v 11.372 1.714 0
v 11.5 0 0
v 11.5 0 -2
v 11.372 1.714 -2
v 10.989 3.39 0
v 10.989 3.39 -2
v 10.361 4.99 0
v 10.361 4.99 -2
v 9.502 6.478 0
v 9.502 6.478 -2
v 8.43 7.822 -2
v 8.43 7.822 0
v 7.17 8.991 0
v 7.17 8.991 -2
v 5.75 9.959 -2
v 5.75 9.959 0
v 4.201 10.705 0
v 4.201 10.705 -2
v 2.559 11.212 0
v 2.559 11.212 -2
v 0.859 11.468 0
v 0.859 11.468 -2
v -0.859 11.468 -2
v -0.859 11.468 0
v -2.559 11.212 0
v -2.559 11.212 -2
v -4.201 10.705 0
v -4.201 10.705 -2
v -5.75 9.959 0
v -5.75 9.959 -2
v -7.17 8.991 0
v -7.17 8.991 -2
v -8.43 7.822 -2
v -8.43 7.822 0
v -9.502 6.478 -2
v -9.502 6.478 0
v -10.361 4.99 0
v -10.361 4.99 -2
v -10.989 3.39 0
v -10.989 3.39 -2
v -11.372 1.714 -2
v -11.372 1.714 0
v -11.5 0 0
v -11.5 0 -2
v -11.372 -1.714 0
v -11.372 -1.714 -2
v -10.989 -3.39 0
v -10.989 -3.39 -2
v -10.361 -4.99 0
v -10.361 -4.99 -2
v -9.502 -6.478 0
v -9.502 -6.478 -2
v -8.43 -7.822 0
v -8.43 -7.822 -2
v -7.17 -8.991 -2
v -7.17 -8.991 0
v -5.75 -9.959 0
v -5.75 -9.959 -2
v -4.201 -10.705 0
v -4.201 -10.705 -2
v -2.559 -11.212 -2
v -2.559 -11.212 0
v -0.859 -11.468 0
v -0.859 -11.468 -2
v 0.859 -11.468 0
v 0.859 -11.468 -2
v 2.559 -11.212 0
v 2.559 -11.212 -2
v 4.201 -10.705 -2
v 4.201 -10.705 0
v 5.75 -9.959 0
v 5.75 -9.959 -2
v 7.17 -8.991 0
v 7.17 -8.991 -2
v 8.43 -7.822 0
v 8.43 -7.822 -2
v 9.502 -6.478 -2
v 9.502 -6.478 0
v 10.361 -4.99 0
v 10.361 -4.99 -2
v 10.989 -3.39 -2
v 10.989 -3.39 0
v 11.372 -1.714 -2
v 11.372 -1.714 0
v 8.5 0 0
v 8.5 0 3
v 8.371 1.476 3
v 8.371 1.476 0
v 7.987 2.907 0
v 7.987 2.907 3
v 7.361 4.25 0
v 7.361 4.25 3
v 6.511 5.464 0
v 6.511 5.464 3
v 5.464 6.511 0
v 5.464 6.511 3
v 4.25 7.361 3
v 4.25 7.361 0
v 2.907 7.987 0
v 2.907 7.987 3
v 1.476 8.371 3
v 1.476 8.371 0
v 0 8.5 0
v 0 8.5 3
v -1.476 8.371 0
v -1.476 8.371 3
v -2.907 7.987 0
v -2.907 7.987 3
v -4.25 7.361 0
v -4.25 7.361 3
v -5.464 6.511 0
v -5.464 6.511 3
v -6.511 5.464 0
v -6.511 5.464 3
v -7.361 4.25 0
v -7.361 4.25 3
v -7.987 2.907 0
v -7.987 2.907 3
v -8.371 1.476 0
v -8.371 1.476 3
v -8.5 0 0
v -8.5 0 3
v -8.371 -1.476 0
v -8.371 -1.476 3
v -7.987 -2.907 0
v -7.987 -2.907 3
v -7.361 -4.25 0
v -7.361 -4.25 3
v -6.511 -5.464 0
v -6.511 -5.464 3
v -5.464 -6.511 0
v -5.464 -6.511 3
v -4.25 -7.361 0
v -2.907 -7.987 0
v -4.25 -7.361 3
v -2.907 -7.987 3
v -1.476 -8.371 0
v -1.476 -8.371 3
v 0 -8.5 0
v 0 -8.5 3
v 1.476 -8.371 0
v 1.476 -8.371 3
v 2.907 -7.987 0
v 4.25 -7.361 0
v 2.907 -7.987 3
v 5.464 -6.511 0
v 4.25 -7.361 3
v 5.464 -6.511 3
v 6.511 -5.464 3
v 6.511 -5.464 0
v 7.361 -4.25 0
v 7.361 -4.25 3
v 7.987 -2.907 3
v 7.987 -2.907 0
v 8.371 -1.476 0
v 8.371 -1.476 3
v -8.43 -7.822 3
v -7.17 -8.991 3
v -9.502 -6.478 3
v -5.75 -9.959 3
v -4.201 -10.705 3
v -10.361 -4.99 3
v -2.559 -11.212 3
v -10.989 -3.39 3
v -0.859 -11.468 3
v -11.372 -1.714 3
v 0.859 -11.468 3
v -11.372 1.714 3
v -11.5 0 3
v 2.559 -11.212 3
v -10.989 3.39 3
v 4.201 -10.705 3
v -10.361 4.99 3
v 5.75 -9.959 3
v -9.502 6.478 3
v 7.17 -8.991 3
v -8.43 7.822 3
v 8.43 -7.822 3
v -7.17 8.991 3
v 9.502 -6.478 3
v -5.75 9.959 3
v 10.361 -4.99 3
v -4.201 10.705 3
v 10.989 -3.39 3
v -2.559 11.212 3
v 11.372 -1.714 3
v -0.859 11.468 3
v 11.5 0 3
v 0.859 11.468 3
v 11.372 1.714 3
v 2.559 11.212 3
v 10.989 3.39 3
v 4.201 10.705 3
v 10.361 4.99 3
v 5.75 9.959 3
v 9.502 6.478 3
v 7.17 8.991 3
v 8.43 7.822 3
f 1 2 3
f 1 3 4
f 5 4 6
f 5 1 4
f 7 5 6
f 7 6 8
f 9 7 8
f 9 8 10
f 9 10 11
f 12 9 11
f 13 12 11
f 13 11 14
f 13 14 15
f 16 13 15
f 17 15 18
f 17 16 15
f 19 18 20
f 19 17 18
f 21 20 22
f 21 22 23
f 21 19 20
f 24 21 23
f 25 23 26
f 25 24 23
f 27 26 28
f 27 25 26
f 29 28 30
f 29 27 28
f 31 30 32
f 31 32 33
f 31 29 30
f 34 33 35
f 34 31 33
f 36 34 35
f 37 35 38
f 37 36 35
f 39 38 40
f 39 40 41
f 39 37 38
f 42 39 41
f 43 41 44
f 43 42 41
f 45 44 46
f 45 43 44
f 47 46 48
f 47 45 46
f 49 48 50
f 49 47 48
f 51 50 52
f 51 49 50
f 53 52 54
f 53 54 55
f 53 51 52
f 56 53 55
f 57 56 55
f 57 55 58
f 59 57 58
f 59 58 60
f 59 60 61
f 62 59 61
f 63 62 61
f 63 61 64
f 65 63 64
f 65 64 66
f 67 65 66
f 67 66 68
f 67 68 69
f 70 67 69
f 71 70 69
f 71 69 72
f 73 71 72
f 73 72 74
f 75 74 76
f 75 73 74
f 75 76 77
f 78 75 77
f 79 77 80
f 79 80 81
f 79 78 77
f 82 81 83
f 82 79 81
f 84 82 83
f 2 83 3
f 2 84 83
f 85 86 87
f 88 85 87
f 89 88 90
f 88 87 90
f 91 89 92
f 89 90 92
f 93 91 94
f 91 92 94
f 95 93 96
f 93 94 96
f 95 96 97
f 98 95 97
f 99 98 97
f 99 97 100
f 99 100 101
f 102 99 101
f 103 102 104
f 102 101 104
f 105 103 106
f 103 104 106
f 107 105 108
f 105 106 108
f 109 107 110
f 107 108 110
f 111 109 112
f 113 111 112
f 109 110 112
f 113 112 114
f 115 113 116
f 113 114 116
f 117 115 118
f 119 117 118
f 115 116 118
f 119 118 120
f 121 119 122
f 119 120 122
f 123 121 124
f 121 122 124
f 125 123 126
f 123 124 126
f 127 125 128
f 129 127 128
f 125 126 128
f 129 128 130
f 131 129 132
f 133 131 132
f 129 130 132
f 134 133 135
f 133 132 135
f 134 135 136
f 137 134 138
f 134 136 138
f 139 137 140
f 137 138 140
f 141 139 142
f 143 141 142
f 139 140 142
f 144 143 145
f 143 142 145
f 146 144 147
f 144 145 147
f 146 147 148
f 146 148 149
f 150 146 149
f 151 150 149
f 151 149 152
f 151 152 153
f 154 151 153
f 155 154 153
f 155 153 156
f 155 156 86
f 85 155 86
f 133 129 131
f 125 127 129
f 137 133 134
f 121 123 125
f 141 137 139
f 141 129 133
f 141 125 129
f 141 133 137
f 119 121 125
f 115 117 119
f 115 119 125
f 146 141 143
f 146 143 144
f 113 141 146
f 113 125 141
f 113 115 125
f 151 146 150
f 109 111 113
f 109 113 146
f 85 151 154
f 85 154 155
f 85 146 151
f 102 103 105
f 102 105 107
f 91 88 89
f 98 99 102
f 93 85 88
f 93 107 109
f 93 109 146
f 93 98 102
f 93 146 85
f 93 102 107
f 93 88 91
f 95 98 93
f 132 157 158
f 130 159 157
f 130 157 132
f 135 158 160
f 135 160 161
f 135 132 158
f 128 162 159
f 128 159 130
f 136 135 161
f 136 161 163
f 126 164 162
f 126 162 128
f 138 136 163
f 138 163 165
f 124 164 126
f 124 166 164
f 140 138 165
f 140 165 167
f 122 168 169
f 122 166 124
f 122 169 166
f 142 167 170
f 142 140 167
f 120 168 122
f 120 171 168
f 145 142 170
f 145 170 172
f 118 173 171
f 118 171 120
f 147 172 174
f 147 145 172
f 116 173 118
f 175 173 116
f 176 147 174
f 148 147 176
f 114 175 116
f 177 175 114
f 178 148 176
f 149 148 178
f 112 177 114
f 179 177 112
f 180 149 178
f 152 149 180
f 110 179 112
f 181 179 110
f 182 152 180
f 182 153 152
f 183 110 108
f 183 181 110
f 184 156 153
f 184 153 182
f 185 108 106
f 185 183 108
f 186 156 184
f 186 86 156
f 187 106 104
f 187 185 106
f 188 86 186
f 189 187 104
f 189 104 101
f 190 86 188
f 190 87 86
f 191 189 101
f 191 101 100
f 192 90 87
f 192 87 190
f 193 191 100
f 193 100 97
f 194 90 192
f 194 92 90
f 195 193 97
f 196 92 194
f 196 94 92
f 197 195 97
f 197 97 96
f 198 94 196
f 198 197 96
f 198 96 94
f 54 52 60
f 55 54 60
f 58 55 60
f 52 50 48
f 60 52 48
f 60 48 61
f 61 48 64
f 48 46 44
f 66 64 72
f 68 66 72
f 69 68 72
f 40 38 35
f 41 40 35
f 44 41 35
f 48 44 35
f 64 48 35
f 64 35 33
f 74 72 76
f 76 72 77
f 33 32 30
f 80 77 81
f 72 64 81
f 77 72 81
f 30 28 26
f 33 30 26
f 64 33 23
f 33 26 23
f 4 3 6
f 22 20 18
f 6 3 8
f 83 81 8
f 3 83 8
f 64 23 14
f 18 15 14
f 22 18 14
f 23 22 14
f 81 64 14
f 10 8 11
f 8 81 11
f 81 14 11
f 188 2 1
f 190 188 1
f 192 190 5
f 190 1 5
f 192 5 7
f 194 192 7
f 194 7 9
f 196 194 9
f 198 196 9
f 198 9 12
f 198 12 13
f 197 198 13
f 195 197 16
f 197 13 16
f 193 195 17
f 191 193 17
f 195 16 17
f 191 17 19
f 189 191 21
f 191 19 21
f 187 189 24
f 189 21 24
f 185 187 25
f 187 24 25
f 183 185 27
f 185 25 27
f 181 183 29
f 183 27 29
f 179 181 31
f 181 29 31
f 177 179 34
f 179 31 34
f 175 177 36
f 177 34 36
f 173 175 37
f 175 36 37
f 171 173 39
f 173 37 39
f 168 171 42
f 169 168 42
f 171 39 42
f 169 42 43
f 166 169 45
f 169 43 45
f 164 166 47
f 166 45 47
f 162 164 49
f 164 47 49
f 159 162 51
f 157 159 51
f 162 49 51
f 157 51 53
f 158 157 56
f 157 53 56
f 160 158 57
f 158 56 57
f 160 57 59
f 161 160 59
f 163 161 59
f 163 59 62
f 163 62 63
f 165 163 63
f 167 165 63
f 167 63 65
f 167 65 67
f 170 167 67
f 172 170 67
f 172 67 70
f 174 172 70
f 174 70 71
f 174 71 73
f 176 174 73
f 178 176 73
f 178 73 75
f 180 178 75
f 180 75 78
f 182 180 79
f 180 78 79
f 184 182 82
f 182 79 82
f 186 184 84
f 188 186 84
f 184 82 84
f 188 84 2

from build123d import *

# Parameters (mm, degrees)
F0_R     = 11.5
F1_DEPTH = 2
F2_R     = 11.5
F3_DEPTH = 3
F4_R     = 8.5
F5_DEPTH = 3


with BuildPart() as f1:
    # F0 (on Top) → F1 (new body)
    with BuildSketch(Plane.XY):
        Circle(F0_R)
    extrude(amount=-F1_DEPTH)

    # F2 (on face) → F3 (join)
    with BuildSketch(Plane.XY):
        Circle(F2_R)
    extrude(amount=F3_DEPTH)

    # F4 (on face) → F5 (cut)
    with BuildSketch(Plane.XY.offset(3)):
        Circle(F4_R)
    extrude(amount=-F5_DEPTH, mode=Mode.SUBTRACT)


solid = f1.part
